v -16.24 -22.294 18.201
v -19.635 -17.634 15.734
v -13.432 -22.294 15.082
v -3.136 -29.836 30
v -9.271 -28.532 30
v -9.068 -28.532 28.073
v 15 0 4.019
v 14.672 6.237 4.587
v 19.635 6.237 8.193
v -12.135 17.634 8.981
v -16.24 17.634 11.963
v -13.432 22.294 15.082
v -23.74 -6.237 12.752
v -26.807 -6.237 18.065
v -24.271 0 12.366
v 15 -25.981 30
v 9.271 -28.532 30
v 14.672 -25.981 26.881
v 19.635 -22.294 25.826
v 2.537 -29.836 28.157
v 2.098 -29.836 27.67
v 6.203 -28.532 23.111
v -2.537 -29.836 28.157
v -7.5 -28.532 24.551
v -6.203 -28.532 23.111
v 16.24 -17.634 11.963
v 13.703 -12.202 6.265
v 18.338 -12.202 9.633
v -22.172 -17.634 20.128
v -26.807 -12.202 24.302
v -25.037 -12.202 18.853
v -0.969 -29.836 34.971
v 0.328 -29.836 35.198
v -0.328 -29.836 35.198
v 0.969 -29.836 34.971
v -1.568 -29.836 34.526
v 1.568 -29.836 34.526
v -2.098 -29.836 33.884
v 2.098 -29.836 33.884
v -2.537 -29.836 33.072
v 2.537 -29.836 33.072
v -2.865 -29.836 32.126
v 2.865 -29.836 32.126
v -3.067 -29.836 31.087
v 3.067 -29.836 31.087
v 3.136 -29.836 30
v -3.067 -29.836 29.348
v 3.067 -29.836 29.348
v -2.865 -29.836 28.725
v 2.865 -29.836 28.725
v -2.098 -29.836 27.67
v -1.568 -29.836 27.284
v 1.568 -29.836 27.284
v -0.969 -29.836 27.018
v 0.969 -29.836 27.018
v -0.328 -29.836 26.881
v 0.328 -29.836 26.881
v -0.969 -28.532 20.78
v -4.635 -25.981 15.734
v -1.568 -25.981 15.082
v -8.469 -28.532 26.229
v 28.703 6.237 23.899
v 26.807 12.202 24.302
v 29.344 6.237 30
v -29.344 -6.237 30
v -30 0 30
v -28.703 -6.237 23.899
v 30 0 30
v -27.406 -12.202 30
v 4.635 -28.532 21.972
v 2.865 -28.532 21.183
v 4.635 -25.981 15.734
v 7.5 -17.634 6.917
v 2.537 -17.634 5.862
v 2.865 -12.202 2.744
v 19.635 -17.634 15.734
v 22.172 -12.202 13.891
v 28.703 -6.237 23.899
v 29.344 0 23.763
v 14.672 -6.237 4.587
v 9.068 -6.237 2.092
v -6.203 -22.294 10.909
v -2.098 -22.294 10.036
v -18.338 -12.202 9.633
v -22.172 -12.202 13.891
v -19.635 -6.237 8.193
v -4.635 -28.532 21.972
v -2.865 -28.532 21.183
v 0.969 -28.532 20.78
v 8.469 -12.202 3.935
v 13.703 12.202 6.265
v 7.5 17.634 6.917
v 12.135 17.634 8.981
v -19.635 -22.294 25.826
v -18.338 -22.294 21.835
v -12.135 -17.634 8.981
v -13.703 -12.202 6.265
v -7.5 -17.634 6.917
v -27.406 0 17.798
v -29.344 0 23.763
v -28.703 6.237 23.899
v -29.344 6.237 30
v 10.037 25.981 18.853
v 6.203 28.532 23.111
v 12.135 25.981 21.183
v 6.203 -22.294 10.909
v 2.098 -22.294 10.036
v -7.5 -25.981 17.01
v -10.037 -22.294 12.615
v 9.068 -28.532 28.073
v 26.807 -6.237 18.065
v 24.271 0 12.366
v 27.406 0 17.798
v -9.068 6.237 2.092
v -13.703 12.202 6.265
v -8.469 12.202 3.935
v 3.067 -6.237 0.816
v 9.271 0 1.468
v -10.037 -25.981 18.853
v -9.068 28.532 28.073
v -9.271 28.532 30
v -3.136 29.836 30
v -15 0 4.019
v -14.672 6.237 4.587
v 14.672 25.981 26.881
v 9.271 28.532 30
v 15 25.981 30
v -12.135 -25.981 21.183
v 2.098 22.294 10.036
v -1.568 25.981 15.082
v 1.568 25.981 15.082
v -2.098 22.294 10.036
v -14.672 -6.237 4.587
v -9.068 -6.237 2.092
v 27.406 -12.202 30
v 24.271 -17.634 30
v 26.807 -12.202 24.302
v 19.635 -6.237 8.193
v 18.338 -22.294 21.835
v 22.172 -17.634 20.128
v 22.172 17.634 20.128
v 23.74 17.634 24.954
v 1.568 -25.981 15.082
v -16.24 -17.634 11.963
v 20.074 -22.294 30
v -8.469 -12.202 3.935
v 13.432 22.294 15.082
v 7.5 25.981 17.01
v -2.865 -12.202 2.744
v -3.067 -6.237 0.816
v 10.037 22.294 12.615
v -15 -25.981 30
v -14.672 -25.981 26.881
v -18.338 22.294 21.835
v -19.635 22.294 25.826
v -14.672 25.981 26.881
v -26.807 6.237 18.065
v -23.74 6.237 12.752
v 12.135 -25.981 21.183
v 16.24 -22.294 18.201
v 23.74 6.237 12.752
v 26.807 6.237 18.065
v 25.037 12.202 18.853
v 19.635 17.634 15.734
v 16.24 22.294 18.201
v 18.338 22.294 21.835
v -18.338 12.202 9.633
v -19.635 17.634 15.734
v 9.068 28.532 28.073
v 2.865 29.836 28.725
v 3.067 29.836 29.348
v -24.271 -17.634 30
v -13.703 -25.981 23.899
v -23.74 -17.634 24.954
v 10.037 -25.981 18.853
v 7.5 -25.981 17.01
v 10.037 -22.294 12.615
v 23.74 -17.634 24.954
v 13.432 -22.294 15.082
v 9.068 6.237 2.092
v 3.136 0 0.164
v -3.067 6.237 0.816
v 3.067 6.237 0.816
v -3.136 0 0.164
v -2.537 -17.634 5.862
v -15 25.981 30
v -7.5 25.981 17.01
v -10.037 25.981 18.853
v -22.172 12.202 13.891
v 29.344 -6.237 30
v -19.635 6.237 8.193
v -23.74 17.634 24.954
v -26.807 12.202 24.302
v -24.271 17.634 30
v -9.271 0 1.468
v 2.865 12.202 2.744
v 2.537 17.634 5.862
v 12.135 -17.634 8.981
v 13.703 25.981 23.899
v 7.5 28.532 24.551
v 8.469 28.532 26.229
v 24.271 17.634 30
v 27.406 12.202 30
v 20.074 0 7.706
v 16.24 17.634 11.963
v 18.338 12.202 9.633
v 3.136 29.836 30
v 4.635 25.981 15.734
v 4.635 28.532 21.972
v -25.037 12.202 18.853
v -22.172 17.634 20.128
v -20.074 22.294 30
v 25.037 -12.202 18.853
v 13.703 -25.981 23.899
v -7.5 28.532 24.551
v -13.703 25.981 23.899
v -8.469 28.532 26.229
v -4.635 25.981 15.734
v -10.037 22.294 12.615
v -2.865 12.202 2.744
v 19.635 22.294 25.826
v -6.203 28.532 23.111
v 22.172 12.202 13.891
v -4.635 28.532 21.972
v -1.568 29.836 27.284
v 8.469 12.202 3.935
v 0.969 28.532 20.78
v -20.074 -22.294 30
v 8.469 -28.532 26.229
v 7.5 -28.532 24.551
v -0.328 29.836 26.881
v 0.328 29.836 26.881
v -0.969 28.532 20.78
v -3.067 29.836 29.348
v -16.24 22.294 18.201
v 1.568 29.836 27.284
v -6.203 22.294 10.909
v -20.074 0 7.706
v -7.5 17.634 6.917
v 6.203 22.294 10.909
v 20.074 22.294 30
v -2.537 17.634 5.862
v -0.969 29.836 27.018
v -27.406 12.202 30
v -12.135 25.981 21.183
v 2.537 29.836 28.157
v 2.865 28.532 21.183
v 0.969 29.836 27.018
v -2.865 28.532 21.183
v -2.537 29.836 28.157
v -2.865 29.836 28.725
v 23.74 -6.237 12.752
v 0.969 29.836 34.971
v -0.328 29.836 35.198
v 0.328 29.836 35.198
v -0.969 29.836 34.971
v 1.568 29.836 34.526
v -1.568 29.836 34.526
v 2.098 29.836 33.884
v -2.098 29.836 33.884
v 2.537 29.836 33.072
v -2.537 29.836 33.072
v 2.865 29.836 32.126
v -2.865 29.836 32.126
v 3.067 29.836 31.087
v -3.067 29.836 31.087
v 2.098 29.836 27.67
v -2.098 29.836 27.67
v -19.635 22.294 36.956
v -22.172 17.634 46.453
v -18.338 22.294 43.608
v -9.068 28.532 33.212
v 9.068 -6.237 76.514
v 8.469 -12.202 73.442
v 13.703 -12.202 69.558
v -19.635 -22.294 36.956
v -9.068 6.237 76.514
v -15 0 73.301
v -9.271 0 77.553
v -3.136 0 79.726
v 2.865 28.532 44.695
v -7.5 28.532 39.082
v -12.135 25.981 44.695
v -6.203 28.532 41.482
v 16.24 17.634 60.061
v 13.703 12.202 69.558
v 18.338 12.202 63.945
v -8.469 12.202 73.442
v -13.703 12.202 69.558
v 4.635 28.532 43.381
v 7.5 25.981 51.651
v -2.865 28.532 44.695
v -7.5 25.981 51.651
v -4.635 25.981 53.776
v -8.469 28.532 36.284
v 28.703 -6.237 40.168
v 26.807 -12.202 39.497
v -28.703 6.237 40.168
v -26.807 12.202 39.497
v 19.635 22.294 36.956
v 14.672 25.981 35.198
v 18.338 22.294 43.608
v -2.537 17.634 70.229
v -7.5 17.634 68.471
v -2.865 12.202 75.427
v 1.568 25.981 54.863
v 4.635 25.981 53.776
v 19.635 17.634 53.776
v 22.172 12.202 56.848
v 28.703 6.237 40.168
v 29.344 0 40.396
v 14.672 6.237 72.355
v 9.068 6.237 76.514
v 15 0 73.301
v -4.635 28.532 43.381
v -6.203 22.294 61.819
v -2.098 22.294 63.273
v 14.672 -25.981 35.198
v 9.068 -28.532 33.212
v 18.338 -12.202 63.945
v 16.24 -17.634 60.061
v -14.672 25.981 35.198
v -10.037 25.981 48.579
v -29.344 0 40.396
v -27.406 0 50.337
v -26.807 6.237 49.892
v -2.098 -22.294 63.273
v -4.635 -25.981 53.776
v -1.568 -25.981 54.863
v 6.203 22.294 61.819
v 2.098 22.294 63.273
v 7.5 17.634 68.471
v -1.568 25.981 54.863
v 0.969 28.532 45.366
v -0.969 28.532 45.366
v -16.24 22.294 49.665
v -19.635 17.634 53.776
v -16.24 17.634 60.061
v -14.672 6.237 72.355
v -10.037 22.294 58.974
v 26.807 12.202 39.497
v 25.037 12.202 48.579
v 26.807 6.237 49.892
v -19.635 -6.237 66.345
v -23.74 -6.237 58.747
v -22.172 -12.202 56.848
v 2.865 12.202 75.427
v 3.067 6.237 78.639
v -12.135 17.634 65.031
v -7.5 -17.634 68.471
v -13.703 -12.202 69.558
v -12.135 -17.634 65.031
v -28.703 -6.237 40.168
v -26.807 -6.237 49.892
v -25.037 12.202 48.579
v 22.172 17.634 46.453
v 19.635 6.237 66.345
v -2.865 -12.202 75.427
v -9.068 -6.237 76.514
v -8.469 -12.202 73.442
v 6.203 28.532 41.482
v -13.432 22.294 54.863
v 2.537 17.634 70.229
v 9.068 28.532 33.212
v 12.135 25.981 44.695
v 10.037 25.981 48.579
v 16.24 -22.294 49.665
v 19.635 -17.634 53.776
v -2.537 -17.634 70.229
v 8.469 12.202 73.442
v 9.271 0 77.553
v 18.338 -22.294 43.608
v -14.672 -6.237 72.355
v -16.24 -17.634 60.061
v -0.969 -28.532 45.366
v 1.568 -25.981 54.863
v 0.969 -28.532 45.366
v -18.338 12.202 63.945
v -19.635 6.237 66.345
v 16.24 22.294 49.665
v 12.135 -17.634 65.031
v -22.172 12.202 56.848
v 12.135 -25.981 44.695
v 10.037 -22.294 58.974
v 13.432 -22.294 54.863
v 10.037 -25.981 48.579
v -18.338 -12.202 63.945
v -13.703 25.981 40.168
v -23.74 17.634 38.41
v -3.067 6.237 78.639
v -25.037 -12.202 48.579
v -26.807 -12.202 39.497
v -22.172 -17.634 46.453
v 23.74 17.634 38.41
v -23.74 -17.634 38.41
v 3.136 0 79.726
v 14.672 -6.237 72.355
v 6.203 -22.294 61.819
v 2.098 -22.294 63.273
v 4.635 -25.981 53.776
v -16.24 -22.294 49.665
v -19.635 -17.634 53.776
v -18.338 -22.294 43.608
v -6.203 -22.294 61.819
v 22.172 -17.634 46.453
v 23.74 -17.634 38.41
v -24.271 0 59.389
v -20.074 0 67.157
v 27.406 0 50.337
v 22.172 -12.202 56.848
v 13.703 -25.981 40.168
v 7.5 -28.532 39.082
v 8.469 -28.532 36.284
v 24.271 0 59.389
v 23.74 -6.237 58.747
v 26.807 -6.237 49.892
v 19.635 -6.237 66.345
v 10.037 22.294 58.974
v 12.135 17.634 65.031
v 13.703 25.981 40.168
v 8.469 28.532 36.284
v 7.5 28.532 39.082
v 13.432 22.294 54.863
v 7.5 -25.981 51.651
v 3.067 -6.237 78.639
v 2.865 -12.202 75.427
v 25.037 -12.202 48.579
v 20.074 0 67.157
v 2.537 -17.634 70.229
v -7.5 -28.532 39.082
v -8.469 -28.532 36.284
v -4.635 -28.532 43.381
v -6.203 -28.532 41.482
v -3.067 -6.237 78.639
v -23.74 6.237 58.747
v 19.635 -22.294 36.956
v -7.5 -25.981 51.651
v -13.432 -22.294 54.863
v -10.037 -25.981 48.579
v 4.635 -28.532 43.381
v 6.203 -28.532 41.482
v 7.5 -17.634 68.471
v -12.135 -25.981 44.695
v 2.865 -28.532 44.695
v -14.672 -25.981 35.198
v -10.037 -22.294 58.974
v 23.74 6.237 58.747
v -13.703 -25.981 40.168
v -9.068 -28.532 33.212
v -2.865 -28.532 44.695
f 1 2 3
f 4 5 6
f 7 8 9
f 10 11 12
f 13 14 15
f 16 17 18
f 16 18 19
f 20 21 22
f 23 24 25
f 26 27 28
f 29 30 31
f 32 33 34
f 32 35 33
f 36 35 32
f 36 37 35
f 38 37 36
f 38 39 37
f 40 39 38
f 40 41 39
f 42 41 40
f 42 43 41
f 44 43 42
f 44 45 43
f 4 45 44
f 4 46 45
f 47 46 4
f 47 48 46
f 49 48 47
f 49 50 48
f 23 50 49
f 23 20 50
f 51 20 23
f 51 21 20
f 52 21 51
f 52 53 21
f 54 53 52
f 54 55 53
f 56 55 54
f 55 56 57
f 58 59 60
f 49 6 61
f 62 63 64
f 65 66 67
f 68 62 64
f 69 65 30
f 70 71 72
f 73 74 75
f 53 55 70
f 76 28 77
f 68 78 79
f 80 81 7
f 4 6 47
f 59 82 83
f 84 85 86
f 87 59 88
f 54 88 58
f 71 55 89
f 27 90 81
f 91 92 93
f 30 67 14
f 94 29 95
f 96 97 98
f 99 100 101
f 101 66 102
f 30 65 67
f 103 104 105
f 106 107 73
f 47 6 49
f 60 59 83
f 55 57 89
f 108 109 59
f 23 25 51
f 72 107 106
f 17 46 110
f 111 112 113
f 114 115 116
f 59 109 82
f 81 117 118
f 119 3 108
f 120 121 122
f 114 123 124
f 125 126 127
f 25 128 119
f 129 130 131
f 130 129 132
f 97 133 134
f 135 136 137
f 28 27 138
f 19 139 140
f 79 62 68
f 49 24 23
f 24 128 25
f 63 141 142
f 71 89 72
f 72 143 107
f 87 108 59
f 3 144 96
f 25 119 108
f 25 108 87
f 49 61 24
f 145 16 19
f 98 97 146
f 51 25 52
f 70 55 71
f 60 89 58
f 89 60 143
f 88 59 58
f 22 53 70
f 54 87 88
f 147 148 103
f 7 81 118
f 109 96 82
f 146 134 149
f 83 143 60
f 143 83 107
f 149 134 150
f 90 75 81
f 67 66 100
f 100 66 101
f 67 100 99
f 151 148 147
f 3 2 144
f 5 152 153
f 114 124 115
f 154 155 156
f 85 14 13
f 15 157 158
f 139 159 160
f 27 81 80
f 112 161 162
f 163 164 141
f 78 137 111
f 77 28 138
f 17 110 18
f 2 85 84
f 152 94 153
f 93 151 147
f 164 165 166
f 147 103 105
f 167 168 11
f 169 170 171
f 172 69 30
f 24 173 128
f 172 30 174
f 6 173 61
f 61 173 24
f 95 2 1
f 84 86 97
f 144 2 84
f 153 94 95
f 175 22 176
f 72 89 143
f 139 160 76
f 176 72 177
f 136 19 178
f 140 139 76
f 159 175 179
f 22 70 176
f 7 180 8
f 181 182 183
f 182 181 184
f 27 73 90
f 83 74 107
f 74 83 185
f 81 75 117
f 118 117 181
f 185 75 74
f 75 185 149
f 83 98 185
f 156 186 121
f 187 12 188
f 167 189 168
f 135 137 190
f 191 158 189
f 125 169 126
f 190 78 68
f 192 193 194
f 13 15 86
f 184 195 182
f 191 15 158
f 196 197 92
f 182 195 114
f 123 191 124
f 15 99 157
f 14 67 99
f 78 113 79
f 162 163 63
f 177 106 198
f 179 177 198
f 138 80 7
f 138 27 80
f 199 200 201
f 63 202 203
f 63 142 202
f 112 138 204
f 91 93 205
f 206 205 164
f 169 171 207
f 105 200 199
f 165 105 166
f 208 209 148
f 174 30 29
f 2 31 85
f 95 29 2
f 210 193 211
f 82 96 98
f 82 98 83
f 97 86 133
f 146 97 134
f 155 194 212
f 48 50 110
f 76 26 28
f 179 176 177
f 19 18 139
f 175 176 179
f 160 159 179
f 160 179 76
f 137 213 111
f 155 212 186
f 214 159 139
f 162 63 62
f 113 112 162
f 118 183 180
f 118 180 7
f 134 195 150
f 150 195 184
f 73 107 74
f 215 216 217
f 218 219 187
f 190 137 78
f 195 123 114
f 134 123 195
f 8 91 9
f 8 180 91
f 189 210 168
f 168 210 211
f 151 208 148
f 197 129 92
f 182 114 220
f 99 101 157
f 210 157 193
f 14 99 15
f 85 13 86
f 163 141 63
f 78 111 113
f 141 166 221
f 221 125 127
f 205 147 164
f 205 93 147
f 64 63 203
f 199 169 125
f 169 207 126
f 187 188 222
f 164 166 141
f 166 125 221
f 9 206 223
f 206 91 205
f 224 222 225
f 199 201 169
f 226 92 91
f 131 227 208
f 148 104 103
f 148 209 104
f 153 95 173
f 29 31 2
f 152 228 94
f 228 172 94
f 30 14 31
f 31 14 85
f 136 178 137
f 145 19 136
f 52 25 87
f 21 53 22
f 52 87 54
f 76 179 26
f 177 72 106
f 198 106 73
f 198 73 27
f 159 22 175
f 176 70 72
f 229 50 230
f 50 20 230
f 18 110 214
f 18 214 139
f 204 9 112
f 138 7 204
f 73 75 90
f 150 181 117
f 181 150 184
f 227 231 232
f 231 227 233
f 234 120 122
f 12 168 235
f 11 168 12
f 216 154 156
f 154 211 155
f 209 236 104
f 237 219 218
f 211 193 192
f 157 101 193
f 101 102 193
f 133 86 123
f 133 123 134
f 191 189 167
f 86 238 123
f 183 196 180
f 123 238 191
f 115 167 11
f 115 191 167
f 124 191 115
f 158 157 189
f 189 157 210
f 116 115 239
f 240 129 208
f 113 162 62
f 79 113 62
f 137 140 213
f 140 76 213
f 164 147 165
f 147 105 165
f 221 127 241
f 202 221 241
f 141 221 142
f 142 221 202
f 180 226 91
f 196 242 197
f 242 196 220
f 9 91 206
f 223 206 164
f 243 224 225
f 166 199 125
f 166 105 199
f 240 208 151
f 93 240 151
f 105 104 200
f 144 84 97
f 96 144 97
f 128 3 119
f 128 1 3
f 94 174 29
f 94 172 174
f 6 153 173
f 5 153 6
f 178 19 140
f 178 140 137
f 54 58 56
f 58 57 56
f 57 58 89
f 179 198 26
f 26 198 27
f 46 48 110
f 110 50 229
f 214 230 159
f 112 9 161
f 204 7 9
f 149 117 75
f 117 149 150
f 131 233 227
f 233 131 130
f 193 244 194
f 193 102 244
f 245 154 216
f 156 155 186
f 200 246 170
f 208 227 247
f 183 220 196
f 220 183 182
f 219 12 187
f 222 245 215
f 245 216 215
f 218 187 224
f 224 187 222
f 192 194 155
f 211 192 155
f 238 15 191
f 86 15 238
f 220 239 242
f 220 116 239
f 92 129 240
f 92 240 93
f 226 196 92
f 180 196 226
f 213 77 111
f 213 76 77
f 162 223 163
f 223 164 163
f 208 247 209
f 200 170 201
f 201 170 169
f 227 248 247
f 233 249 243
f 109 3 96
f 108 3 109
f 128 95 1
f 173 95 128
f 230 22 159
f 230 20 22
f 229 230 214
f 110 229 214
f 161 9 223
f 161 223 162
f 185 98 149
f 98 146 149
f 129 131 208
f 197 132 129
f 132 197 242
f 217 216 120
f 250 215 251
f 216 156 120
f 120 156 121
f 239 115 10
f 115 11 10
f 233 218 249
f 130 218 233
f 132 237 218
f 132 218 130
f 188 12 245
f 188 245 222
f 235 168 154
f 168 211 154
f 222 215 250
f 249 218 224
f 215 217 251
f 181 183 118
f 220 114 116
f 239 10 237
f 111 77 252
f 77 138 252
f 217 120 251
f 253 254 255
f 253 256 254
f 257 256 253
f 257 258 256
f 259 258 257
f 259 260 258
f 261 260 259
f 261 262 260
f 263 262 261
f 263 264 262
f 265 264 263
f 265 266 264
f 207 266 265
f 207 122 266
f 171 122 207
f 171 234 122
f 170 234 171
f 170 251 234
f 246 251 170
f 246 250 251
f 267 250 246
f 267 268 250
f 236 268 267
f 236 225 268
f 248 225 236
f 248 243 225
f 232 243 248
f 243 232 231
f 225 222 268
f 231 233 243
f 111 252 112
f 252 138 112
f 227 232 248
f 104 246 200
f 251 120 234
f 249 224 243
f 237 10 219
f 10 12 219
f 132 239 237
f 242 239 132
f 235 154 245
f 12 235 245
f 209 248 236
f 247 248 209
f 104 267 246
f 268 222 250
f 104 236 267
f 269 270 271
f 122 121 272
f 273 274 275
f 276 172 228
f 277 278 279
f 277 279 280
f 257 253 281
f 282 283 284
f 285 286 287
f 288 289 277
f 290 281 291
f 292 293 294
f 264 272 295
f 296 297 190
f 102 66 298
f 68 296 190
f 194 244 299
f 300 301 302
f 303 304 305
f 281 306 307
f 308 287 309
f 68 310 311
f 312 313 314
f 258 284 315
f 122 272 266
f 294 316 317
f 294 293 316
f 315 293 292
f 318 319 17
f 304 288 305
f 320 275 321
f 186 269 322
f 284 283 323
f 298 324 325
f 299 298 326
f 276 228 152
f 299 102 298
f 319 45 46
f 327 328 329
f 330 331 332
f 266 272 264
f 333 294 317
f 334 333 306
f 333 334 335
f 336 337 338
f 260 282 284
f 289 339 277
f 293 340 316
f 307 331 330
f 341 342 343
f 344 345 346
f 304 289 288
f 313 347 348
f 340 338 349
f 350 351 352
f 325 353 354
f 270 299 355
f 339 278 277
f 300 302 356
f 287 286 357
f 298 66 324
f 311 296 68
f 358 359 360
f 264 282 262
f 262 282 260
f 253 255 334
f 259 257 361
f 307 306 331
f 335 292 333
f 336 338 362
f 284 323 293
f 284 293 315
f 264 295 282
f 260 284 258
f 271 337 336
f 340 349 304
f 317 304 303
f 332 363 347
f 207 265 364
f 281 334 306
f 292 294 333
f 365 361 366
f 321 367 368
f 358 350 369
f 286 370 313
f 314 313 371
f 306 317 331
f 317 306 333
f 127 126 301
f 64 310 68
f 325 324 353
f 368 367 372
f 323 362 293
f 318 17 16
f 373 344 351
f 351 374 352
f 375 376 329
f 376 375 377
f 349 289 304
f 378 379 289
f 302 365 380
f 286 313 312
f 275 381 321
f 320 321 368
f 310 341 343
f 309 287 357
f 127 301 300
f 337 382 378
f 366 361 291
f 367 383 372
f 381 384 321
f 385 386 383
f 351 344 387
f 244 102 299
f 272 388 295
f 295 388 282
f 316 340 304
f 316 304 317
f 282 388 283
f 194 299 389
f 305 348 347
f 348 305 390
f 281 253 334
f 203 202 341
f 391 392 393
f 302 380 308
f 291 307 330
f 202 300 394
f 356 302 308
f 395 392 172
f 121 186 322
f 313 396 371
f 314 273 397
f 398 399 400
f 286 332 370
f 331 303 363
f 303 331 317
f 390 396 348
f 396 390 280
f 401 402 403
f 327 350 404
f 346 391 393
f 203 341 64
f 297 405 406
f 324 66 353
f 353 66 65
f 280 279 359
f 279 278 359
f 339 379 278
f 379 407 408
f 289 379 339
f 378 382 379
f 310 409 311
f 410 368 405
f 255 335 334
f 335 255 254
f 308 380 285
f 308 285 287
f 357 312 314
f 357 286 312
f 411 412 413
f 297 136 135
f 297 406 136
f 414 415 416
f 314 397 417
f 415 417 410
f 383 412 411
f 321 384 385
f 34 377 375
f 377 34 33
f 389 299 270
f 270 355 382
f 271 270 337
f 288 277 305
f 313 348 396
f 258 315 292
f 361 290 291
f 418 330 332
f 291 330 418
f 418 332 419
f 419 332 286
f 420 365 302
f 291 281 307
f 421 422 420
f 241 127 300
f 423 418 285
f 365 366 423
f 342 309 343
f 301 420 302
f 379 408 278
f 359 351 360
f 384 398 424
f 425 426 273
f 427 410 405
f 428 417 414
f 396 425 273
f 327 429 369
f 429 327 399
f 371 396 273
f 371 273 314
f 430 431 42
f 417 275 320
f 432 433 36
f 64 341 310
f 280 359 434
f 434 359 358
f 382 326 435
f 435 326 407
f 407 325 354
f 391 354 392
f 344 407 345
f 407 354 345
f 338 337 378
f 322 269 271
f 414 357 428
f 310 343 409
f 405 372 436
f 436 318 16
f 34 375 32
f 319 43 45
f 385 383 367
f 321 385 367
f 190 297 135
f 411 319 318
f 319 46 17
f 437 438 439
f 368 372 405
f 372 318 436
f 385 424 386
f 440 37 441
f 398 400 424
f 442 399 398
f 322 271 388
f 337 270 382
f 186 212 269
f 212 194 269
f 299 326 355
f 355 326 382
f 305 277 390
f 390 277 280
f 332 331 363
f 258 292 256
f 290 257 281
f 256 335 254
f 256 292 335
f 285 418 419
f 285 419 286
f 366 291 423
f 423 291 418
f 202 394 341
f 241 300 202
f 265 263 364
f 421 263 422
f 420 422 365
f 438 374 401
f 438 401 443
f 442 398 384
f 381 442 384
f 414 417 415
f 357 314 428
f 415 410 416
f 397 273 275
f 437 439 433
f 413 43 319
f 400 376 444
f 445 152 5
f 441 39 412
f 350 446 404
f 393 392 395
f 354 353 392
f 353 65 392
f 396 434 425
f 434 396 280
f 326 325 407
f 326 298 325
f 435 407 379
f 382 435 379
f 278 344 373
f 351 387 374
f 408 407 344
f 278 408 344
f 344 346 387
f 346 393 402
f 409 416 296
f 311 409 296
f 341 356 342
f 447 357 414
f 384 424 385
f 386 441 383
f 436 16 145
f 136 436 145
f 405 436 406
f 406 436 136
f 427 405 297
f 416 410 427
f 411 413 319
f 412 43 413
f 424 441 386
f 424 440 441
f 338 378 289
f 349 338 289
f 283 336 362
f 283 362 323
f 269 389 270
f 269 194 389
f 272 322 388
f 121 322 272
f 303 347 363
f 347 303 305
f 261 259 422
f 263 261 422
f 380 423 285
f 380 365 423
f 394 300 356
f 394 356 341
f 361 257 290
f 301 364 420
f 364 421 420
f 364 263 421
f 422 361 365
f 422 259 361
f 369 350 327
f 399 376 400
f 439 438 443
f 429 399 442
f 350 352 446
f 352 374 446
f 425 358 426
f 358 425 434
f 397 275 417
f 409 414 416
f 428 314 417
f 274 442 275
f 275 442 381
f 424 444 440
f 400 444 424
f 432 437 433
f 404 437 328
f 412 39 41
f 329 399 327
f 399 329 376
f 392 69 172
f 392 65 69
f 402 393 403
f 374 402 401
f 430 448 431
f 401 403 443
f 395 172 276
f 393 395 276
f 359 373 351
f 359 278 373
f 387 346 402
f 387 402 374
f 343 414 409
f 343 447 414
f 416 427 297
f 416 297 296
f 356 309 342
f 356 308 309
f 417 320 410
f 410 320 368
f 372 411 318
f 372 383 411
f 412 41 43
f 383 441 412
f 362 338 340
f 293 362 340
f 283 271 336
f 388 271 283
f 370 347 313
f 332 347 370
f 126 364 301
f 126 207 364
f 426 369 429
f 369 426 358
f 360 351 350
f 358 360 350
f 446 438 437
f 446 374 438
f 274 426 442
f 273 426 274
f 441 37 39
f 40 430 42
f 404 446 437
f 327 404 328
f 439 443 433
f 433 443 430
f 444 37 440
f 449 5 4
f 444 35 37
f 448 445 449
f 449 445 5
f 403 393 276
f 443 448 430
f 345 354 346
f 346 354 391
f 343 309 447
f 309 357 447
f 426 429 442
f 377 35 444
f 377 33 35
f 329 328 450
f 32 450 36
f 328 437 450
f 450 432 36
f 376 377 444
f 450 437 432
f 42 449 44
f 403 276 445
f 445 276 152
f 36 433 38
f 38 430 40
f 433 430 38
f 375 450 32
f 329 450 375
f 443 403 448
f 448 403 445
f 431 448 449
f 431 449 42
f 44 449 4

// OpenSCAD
module half_sphere(
    d
) {
    rotate([-90, 0, 0])
        rotate_extrude(angle = 180)
            difference() {
                circle(d = d);
                translate([d / 2, 0]) square([d, d], center = true);
            }
}

module egg(
    h,
    w,
) {
    radius = w / 2;

    scale_z = (h - radius) / radius;
    egg_offset_z = radius;

    translate([0, 0, egg_offset_z])
        union() {
            rotate([180, 0, 0])half_sphere(d = w);
            scale([1, 1, scale_z]) half_sphere(d = w);
        }
}

egg(h = 80, w = 60);
